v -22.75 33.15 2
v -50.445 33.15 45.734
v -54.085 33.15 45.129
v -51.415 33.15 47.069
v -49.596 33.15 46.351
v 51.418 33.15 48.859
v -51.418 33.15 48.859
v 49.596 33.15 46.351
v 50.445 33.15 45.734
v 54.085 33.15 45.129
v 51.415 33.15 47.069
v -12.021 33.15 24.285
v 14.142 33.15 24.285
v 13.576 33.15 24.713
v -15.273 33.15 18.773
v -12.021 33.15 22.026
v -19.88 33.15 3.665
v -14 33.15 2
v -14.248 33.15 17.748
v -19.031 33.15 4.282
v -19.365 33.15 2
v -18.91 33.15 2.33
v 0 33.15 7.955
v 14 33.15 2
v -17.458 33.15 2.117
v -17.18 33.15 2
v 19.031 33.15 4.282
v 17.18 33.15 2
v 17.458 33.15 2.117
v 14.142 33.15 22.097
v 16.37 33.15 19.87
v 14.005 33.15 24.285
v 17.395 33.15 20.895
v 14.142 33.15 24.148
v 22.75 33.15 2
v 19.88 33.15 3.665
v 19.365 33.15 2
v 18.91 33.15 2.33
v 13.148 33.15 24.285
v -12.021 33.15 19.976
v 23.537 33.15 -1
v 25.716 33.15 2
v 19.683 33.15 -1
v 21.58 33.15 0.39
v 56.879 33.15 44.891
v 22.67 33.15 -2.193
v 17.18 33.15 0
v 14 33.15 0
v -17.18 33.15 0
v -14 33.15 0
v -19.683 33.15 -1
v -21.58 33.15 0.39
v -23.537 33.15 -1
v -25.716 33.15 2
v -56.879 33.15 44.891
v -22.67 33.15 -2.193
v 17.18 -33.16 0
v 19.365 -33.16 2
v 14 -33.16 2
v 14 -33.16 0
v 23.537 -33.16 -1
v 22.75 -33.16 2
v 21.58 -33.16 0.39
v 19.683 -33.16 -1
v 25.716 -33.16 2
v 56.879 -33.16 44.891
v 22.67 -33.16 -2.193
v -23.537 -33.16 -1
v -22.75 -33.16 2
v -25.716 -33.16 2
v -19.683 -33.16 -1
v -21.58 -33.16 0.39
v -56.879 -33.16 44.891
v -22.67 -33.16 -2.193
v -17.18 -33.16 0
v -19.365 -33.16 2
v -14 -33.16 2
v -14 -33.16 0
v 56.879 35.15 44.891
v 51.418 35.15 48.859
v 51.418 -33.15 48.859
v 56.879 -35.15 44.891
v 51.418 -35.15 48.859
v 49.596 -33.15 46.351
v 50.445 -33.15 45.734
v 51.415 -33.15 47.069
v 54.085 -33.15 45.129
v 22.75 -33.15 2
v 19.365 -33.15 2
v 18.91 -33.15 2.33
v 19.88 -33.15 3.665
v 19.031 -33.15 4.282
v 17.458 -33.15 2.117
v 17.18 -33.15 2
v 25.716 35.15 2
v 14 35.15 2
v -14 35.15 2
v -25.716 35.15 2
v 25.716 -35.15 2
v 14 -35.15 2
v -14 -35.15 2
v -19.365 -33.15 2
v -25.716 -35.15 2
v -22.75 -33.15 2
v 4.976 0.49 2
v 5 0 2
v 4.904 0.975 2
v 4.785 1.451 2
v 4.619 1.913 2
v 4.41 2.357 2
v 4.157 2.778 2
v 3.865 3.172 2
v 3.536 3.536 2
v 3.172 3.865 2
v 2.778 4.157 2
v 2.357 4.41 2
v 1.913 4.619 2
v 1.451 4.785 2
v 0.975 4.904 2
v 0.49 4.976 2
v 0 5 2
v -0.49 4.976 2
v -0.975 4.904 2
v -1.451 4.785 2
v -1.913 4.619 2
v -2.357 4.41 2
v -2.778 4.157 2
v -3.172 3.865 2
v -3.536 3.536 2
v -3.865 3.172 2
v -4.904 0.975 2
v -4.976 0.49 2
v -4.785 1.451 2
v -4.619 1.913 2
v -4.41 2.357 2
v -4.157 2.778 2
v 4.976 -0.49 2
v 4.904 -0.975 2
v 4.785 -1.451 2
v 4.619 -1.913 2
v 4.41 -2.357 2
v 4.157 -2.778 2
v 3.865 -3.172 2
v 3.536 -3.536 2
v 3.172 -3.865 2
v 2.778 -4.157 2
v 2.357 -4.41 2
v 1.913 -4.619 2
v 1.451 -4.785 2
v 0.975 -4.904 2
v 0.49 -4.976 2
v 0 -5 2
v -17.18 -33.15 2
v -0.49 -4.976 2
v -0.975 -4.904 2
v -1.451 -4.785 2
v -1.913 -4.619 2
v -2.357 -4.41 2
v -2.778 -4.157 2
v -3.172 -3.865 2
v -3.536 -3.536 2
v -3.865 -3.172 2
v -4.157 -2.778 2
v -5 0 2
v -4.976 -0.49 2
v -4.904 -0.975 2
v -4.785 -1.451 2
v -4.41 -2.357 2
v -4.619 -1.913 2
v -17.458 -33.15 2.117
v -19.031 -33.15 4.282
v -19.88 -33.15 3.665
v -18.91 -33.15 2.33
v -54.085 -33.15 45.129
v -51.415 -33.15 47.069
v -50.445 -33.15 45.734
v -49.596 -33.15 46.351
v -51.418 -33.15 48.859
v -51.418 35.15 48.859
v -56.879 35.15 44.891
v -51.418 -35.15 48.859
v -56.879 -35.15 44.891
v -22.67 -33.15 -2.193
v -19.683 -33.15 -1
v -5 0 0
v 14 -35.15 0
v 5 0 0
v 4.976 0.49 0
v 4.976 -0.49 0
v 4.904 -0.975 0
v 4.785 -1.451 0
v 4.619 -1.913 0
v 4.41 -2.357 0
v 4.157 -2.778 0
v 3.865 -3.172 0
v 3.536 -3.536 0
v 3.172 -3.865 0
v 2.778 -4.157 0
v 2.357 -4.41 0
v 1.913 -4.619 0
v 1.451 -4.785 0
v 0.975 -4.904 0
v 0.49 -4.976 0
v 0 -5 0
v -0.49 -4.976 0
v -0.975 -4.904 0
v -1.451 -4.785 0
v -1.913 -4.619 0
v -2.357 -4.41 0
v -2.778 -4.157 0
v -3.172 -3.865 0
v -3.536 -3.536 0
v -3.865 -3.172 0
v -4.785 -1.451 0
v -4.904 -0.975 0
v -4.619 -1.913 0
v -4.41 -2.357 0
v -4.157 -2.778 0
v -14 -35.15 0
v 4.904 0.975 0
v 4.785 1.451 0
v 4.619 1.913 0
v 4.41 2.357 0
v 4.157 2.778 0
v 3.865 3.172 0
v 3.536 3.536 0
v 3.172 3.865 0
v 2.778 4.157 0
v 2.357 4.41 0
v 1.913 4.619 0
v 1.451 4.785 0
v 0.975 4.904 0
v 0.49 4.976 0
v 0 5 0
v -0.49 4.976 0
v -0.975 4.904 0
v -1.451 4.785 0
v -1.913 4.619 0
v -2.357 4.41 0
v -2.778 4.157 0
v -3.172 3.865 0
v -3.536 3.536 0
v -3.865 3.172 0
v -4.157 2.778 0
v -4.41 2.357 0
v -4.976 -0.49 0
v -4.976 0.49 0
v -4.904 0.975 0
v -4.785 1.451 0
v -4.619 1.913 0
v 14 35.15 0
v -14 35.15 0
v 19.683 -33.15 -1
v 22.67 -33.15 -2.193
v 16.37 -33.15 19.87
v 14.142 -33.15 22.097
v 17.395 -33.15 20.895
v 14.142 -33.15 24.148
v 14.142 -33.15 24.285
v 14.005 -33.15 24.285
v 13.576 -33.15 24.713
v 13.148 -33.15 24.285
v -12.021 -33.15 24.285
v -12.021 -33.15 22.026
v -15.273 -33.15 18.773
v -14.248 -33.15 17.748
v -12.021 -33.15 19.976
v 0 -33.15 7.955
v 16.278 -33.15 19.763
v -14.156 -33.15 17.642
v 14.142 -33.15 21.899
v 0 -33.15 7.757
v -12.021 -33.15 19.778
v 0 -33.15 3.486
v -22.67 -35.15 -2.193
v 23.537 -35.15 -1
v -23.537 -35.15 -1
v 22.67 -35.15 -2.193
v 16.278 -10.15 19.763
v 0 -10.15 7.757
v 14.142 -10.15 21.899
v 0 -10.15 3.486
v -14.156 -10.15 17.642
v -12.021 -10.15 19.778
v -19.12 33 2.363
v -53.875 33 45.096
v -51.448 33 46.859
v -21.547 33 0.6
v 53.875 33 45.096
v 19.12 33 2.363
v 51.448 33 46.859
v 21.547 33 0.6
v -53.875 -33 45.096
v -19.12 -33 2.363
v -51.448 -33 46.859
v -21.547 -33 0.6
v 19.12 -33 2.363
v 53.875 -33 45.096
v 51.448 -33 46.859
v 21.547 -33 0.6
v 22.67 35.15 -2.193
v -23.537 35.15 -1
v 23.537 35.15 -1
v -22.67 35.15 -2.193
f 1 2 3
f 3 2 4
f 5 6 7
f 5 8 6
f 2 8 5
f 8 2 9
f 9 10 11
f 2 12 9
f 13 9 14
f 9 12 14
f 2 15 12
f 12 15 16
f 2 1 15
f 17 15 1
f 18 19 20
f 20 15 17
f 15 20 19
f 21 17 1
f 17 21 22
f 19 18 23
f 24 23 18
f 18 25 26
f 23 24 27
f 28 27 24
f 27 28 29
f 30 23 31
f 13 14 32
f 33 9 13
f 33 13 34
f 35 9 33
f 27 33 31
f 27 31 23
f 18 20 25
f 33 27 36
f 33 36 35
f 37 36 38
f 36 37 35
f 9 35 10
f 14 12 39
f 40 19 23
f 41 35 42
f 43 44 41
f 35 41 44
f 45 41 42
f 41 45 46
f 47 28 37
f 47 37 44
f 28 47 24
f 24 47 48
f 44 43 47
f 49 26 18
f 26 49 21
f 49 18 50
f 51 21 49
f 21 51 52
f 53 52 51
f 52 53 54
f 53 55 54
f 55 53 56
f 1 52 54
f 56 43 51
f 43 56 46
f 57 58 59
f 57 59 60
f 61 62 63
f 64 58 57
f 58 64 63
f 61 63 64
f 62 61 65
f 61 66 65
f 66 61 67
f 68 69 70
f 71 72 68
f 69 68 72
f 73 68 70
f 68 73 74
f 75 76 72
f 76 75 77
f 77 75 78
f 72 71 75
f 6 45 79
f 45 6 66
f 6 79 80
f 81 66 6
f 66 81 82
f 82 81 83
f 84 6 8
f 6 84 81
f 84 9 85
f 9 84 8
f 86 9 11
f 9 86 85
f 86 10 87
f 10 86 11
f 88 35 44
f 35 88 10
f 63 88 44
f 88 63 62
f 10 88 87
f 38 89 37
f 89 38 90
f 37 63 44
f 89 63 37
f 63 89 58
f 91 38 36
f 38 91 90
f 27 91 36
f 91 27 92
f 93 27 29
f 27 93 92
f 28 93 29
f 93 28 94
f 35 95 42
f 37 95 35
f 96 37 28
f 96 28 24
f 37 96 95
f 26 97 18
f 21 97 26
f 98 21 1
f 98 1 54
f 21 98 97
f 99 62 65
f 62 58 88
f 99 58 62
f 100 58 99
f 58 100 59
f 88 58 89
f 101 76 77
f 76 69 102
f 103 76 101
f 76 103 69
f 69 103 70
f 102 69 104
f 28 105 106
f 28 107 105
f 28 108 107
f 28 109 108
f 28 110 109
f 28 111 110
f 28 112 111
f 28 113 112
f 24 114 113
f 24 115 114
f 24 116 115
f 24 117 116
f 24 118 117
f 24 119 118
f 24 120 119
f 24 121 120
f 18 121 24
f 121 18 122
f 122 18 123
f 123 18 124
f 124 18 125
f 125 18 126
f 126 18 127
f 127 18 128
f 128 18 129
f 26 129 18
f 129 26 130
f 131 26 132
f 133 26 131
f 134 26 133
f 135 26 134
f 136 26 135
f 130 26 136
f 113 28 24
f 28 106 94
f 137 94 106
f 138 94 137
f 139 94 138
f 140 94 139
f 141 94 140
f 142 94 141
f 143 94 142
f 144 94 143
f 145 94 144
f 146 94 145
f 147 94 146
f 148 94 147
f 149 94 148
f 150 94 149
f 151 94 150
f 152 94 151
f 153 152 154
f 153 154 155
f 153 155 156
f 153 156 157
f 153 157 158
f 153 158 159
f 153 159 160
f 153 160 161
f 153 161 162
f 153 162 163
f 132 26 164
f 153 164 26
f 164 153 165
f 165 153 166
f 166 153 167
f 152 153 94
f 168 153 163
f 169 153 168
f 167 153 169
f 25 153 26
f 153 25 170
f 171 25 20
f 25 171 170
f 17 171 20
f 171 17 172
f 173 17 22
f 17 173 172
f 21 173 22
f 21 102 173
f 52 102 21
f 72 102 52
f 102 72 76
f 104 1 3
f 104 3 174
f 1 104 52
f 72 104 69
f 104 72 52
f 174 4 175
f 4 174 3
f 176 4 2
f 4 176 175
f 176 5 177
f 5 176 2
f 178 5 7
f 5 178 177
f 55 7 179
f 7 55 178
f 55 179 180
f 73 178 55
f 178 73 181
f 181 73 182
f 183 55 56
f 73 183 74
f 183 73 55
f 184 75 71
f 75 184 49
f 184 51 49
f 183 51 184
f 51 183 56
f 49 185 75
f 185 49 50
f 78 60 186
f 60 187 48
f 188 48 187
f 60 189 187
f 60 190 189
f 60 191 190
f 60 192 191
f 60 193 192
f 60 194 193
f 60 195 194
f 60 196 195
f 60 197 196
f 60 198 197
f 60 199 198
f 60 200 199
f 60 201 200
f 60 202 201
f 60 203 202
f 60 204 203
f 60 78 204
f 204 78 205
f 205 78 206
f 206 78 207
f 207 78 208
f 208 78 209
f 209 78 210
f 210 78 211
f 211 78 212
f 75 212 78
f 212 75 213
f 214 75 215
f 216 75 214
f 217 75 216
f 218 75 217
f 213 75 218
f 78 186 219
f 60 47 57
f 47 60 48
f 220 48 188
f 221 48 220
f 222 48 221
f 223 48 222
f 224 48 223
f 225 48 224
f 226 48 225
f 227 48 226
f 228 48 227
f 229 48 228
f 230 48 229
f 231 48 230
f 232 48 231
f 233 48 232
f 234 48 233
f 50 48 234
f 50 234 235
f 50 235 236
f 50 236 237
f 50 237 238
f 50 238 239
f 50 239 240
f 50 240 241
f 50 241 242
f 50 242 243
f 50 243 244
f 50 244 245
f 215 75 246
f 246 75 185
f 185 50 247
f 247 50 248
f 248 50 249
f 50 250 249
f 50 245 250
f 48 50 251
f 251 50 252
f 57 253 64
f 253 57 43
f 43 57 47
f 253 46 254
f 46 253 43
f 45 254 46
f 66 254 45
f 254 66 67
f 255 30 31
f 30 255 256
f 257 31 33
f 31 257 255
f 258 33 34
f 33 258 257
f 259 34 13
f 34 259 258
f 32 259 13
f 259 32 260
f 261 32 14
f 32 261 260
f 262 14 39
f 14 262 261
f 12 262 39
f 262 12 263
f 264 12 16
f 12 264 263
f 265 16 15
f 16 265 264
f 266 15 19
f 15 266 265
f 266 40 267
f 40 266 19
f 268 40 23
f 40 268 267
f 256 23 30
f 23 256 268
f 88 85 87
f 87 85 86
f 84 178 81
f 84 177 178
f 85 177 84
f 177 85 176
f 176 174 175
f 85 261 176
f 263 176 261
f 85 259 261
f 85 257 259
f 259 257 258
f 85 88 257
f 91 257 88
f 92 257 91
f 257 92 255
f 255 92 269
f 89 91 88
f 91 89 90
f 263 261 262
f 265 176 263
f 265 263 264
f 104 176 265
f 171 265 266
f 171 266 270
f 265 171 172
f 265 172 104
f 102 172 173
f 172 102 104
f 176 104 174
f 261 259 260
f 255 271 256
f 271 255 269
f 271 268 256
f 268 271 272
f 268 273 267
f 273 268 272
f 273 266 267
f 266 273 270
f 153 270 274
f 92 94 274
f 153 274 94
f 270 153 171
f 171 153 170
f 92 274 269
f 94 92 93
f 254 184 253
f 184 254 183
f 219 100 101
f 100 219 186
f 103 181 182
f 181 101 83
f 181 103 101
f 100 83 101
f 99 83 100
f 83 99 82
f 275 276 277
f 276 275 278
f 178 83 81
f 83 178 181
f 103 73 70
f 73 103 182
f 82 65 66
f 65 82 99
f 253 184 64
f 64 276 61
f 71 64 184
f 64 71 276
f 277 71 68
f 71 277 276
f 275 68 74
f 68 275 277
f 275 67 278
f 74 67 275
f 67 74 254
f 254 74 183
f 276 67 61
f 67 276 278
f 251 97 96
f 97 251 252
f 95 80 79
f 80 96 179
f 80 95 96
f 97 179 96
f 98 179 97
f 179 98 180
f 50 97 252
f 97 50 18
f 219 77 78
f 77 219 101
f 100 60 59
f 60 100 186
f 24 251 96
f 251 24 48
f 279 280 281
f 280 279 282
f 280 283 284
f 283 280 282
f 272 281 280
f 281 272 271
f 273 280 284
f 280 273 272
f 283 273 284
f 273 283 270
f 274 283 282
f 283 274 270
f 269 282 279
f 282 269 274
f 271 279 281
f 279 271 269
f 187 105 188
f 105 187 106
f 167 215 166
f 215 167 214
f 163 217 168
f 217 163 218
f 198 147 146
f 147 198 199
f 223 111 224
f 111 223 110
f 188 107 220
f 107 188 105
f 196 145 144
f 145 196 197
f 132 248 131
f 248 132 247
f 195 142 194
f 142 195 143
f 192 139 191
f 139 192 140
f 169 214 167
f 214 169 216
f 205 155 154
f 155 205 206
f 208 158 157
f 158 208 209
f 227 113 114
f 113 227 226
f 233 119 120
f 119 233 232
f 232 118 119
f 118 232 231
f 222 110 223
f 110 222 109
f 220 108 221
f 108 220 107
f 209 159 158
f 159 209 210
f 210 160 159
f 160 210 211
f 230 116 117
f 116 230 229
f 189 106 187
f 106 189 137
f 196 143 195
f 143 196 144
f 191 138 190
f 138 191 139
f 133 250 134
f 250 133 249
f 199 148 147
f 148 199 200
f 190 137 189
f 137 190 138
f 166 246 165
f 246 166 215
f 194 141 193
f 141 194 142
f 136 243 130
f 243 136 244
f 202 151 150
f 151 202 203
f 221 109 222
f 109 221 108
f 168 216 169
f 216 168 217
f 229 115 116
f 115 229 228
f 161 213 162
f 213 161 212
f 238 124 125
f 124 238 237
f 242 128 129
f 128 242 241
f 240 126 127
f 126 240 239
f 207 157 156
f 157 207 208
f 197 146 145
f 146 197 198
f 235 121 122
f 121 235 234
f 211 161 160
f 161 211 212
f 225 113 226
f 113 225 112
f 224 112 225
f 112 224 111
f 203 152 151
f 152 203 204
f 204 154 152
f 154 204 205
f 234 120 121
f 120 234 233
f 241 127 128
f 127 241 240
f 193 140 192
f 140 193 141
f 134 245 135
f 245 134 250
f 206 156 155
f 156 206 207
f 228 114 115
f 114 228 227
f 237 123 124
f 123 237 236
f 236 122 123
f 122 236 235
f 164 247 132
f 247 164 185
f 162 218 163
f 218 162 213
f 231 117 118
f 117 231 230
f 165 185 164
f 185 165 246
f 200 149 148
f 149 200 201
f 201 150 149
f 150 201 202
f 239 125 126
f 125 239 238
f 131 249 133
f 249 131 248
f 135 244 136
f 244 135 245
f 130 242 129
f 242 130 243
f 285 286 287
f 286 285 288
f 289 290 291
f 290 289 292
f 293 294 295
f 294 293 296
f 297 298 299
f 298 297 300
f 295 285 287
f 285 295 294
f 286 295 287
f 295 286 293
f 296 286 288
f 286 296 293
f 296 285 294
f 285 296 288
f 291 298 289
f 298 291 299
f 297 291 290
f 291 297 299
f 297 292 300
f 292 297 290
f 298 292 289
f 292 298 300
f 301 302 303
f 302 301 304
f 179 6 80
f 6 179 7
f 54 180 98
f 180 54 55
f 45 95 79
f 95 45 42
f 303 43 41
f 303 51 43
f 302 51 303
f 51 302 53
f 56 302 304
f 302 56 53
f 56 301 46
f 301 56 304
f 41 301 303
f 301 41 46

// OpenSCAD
// Four-mirror stereo splitter holder for a single phone camera
// Target: Redmi Note 12 Pro 5G main camera (5.59 mm lens, 8.192 x 6.144 mm sensor).
//
// Coordinate frame (assembly):
//   X = stereo baseline axis. Align with the phone's LONG edge (the sensor's long side).
//   Y = mirror width axis (the phone's short edge).
//   Z = camera optical axis; z = 0 is the camera cover glass, the holder bottom sits there.
// The whole optical cross-section lives in the XZ plane and is extruded along Y, so the
// body prints standing on its fixed end cap with every mirror seat vertical (no supports).
//
// Light path (left eye; right is mirrored): lens -> inner mirror (45 deg V) -> outer mirror
// (turned TOE deg from 45 so each half-field looks straight ahead) -> scene.
//
// The layout is solved here from first principles (chief ray + footprint corner rays) and
// was verified against a separate 3D ray trace (design.py / verify_profile.py) for the
// presets in LAYOUTS. Other combinations render, but check the console for warnings.

/* [Mirror set] */
// Which mirrors you bought
preset = "custom3"; // [cart:50x50x6 outer + 25x25x3 inner, custom3:55x66x3 outer + 20x20x3 inner, custom2:55x66x3 outer + 20x20x2 inner]
// Stereo baseline in mm (distance between the two eyes)
baseline = 55; // [50:5:65]

/* [Output] */
// What to render
part = "assembly"; // [assembly, body, cap, profile, glass2d]

/* [Camera] */
focal_mm = 5.59;
sensor_w = 8.192;           // along X (baseline)
sensor_h = 6.144;           // along Y
f_number = 1.9;
pupil_depth = 1.0;          // entrance pupil below the cover glass (estimate)

/* [Fit] */
glue_gap = 0.15;            // clearance between glass and printed seats
wall = 2.4;                 // backer / roof wall thickness
base_t = 2.0;               // bottom plate thickness (sits on the camera glass)
cap_t = 2.0;                // end cap thickness
lip = 1.5;                  // how far end lips overlap the outer mirror face
lip_h = 1.2;                // how far lips stand proud of the outer mirror face
end_t = 1.6;                // end-stop wall thickness at mirror ends
min_glass_z = 0.6;          // lowest outer-mirror glass point above the phone
lens_hole_d = 10;           // hole over the main lens
lens_ring_d = 0;            // optional socket for a raised lens ring (0 = off)
lens_ring_h = 0.8;
base_pad_w = 28;            // width (X) of the solid mounting pad under the lens, full length in Y

$fn = 64;

// ---------------------------------------------------------------------------
// Data
// ---------------------------------------------------------------------------
// preset -> [outer_len (tilted side), outer_width (Y), outer_t, inner_side, inner_t]
SETS = [
    ["cart",    50, 50, 6, 25, 3],
    ["custom3", 55, 66, 3, 20, 3],
    ["custom2", 55, 66, 3, 20, 2],
];
// [preset, baseline] -> [apex height above glass, usable field fraction]
// From the ray-trace search: largest field with zero clipping.
LAYOUTS = [
    ["cart", 55, 4.0, 0.72], ["cart", 60, 4.5, 0.76], ["cart", 65, 4.0, 0.74],
    ["custom3", 50, 3.5, 0.84], ["custom3", 55, 3.5, 0.84], ["custom3", 60, 3.5, 0.84],
    ["custom2", 50, 3.5, 0.84], ["custom2", 55, 3.5, 0.84], ["custom2", 60, 3.5, 0.84],
];

function lookup_set(p) = [for (s = SETS) if (s[0] == p) s][0];
function lookup_layout(p, b) = [for (l = LAYOUTS) if (l[0] == p && l[1] == b) l][0];

S = lookup_set(preset);
assert(S != undef, str("Unknown preset ", preset));
OUT_L = S[1]; OUT_W = S[2]; OUT_T = S[3]; IN_S = S[4]; IN_T = S[5];
LAY = lookup_layout(preset, baseline);
APEX = LAY == undef ? 4.0 : LAY[2];
FIELD = LAY == undef ? 0.7 : LAY[3];
if (LAY == undef) echo("WARNING: no verified layout for this preset/baseline; using apex 4.0, field 0.70");

// ---------------------------------------------------------------------------
// Optics (2D, XZ plane, left half). Vectors are [x, z].
// ---------------------------------------------------------------------------
TH_C = 18;                                   // centre of each eye's half-field (deg)
HX = atan(sensor_w / 2 / focal_mm);          // 36.2
HY = atan(sensor_h / 2 / focal_mm);          // 28.8
PUPIL = focal_mm / f_number;
PHI_IN = 135;                                // inner mirror line angle
TOE = TH_C / 2;                              // outer mirror turned this much from 45 deg
PHI_OUT = 135 - TOE;                         // 126
WX = TH_C * FIELD;
HYU = atan(tan(HY) * FIELD);

function dir(a) = [cos(a), sin(a)];
function dot2(a, b) = a[0] * b[0] + a[1] * b[1];
function len2(a) = sqrt(dot2(a, a));
// Intersection of p + t v with q + s u.
function lint(p, v, q, u) =
    let(det = -v[0] * u[1] + u[0] * v[1],
        d = q - p,
        t = (-d[0] * u[1] + u[0] * d[1]) / det)
    p + t * v;

O = [0, -pupil_depth];                       // entrance pupil centre
A = [0, APEX];                               // apex of the inner V (coated edges meet)
D_IN = dir(PHI_IN);
D_OUT = dir(PHI_OUT);
P1 = lint(O, dir(90 + TH_C), A, D_IN);       // chief ray on inner mirror
V1 = dir(2 * PHI_IN - (90 + TH_C));          // after inner reflection
P2 = lint(P1, V1, [-baseline / 2, 0], [0, 1]); // chief ray on outer mirror, x = -B/2
N_OUT0 = [-D_OUT[1], D_OUT[0]];
N_OUT = dot2(N_OUT0, V1) > 0 ? -N_OUT0 : N_OUT0;  // coated face normal (toward light)
BACK_OUT = -N_OUT;

// Footprint of the used field on the outer mirror (along-line s from P2, and half-height y).
FOOT = [
    for (i = [0:12]) for (px = [-PUPIL / 2, 0, PUPIL / 2])
        let(thx = TH_C - WX + 2 * WX * i / 12,
            p = [px, -pupil_depth],
            v = dir(90 + thx),
            h1 = lint(p, v, A, D_IN))
        if (h1[0] <= 0)
            let(v1 = dir(2 * PHI_IN - (90 + thx)),
                h2 = lint(h1, v1, P2, D_OUT),
                lxz = len2(h1 - p) + len2(h2 - h1))
            [dot2(h2 - P2, D_OUT), PUPIL / 2 + tan(HYU) * lxz * cos(thx), dot2(h1 - A, D_IN)]
];
F_LO = min([for (f = FOOT) f[0]]);
F_HI = max([for (f = FOOT) f[0]]);
F_Y = max([for (f = FOOT) f[1]]);
IN_USED = max([for (f = FOOT) f[2]]);

// Outer mirror placement: centre it on the footprint, then lift it until the glass clears the phone.
S_CENTRE = (F_LO + F_HI) / 2 - OUT_L / 2;
S_LIFT = (min_glass_z - P2[1] - min(0, BACK_OUT[1] * OUT_T)) / D_OUT[1];
S0 = max(S_CENTRE, S_LIFT);

echo(str("preset=", preset, " baseline=", baseline, " apex=", APEX, " field=", FIELD,
         " (~", round(2048 * FIELD * 3072 * FIELD / 1e5) / 10, " MP/eye)"));
echo(str("P2=", P2, " outer s0=", S0, " footprint s=", F_LO, "..", F_HI, " y=+-", F_Y,
         " inner used to s=", IN_USED));
if (S0 + lip > F_LO) echo("WARNING: lower outer lip shadows the image; reduce field or raise apex");
if (S0 + OUT_L - lip < F_HI) echo("WARNING: outer mirror too short for this field");
if (F_Y > OUT_W / 2 - 0.5) echo("WARNING: outer mirror too narrow for this field");
if (IN_USED > IN_S - 0.5) echo("WARNING: inner mirror too short for this field");

// ---------------------------------------------------------------------------
// 2D geometry helpers (all in XZ)
// ---------------------------------------------------------------------------
// Rectangle in a mirror's local frame: s along line dir d from origin o, t along normal n.
module local_rect(o, d, n, s0, s1, t0, t1) {
    polygon([o + d * s0 + n * t0, o + d * s1 + n * t0, o + d * s1 + n * t1, o + d * s0 + n * t1]);
}

// Inner plates. Left plate: coated face from A along D_IN, its end face lies on the right
// mirror's line. Right plate: starts IN_T along its line so its end butts the left plate's back.
D_R = [-D_IN[0], D_IN[1]];                   // 45 deg
N_IN_L = [D_IN[1], -D_IN[0]];                // [0.707,-0.707]? choose the one facing the lens
N_L = dot2(N_IN_L, [0, 1]) < 0 ? N_IN_L : -N_IN_L;   // coated normal (faces lens, -z side)
N_R = [-N_L[0], N_L[1]];
BACK_L = -N_L;
BACK_R = -N_R;

module inner_left_glass2d() { local_rect(A, D_IN, N_L, 0, IN_S, -IN_T, 0); }
module inner_right_glass2d() { local_rect(A, D_R, N_R, IN_T, IN_T + IN_S, -IN_T, 0); }
module outer_left_glass2d() { local_rect(P2, D_OUT, N_OUT, S0, S0 + OUT_L, -OUT_T, 0); }

module glass2d() {
    inner_left_glass2d();
    inner_right_glass2d();
    outer_left_glass2d();
    mirror([1, 0]) outer_left_glass2d();
}

L1B = A + D_IN * IN_S + BACK_L * IN_T;       // left plate, outer back corner
R1B = A + D_R * (IN_T + IN_S) + BACK_R * IN_T;
W0 = A + D_R * IN_T + BACK_R * IN_T;         // where both back faces meet
WEDGE_TOP = max(L1B[1], R1B[1]) + wall;

module wedge2d() {
    polygon([W0, R1B, [R1B[0], WEDGE_TOP], [L1B[0], WEDGE_TOP], L1B]);
    // End stops just past each plate's outer end (no lip in front of the coated face).
    local_rect(A, D_IN, N_L, IN_S, IN_S + end_t, -IN_T - wall, 0);
    local_rect(A, D_R, N_R, IN_T + IN_S, IN_T + IN_S + end_t, -IN_T - wall, 0);
}

module outer_seat_left2d() {
    tb = -OUT_T - glue_gap;                  // back of glass (with glue gap)
    local_rect(P2, D_OUT, N_OUT, S0 - end_t, S0 + OUT_L + end_t, tb - wall, tb);       // backer
    local_rect(P2, D_OUT, N_OUT, S0 - end_t, S0 - glue_gap, tb - wall, lip_h);          // low end stop
    local_rect(P2, D_OUT, N_OUT, S0 + OUT_L + glue_gap, S0 + OUT_L + end_t, tb - wall, lip_h); // high end stop
    local_rect(P2, D_OUT, N_OUT, S0 - end_t, S0 + lip, glue_gap, lip_h);                 // low lip
    local_rect(P2, D_OUT, N_OUT, S0 + OUT_L - lip, S0 + OUT_L + end_t, glue_gap, lip_h); // high lip
}

// Lowest end of the outer backer, used to tie it to the base plate.
OUT_LOW_IN = P2 + D_OUT * (S0 - end_t);
OUT_LOW_BK = OUT_LOW_IN + N_OUT * (-OUT_T - glue_gap - wall);
X_EXT = max(abs(OUT_LOW_BK[0]), abs((P2 + D_OUT * (S0 + OUT_L + end_t) + N_OUT * (-OUT_T - glue_gap - wall))[0]));

module base2d() {
    // Bottom plate from the inner edge of one outer backer's foot to the other.
    x0 = abs(OUT_LOW_IN[0]) + 1;
    translate([-x0, 0]) square([2 * x0, base_t]);
}

module outer_foot_left2d() {
    // Web from the backer's lower end down to the base plate.
    hull() {
        local_rect(P2, D_OUT, N_OUT, S0 - end_t, S0 + 6, -OUT_T - glue_gap - wall, -OUT_T - glue_gap);
        translate([OUT_LOW_IN[0] - 1, 0]) square([2, base_t]);
        translate([OUT_LOW_BK[0], 0]) square([0.01, base_t]);
    }
}

module profile2d() {
    difference() {
        union() {
            base2d();
            wedge2d();
            outer_seat_left2d();
            mirror([1, 0]) outer_seat_left2d();
            outer_foot_left2d();
            mirror([1, 0]) outer_foot_left2d();
        }
        offset(delta = glue_gap) glass2d();
        // Lens window through the base (2D cut is through the whole extrusion; the 3D hole is
        // round and added in body(); here keep a slot so the 2D check sees the light path).
        translate([-lens_hole_d / 2, -1]) square([lens_hole_d, base_t + 2]);
    }
}

// End cap outline: everything the profile covers, closed, minus the base strip.
module cap2d() {
    difference() {
        hull() profile2d();
        translate([-500, -1]) square([1000, base_t + 1]);
    }
}

// ---------------------------------------------------------------------------
// 3D
// ---------------------------------------------------------------------------
W = OUT_W + 2 * glue_gap;                    // inside width between end caps

module extrude_y(h, y0) {
    // 2D (x, z) -> 3D, occupying y in [y0, y0 + h]
    translate([0, y0 + h, 0]) rotate([90, 0, 0]) linear_extrude(height = h) children();
}

// Parts that meet the fixed end cap reach EPS into it, so the union overlaps instead of merely
// touching (touching faces gave a non-manifold, "mesh is not closed" STL in OpenSCAD 2021.01).
EPS = 0.01;

module body() {
    difference() {
        union() {
            // Profile without the lens slot: the base is solid except the round lens hole.
            extrude_y(W + EPS, -W / 2 - EPS) difference() {
                union() {
                    base2d(); wedge2d();
                    outer_seat_left2d(); mirror([1, 0]) outer_seat_left2d();
                    outer_foot_left2d(); mirror([1, 0]) outer_foot_left2d();
                }
                offset(delta = glue_gap) glass2d();
            }
            // Fixed end cap (print bed side) at -Y.
            extrude_y(cap_t, -W / 2 - cap_t) cap2d();
            // Mounting pad: base plate continues under both end caps.
            extrude_y(W + 2 * cap_t, -W / 2 - cap_t)
                translate([-base_pad_w / 2, 0]) square([base_pad_w, base_t]);
            // Inner plate spacers: hold the narrower inner mirrors centred in Y from the fixed cap.
            sp = (W - IN_S) / 2 - glue_gap;
            // The two plates meet at a single corner; offset merges them so the extrusion is closed.
            if (sp > 0.4) extrude_y(sp + EPS, -W / 2 - EPS) offset(delta = EPS) {
                inner_left_glass2d();
                inner_right_glass2d();
            }
        }
        // Round lens hole and optional ring socket.
        translate([0, 0, -1]) cylinder(d = lens_hole_d, h = base_t + 2);
        if (lens_ring_d > 0) translate([0, 0, -0.01]) cylinder(d = lens_ring_d, h = lens_ring_h);
    }
}

module cap() {
    // Removable end cap (+Y side). Glue it on after the mirrors are in.
    extrude_y(cap_t, W / 2) cap2d();
}

module glass3d() {
    color("silver", 0.6) {
        extrude_y(IN_S, -IN_S / 2) { inner_left_glass2d(); inner_right_glass2d(); }
        extrude_y(OUT_W, -OUT_W / 2) { outer_left_glass2d(); mirror([1, 0]) outer_left_glass2d(); }
    }
}

if (part == "assembly") {
    color("dimgray") body();
    color("gray") cap();
    glass3d();
    // Phone camera glass reference
    %translate([0, 0, -0.5]) cylinder(d = 12, h = 0.5);
} else if (part == "body") {
    // Print orientation: fixed end cap flat on the bed, mirror seats vertical.
    rotate([90, 0, 0]) translate([0, W / 2 + cap_t, 0]) body();
} else if (part == "cap") {
    rotate([90, 0, 0]) translate([0, -W / 2, 0]) cap();
} else if (part == "profile") {
    profile2d();
} else if (part == "glass2d") {
    glass2d();
}
